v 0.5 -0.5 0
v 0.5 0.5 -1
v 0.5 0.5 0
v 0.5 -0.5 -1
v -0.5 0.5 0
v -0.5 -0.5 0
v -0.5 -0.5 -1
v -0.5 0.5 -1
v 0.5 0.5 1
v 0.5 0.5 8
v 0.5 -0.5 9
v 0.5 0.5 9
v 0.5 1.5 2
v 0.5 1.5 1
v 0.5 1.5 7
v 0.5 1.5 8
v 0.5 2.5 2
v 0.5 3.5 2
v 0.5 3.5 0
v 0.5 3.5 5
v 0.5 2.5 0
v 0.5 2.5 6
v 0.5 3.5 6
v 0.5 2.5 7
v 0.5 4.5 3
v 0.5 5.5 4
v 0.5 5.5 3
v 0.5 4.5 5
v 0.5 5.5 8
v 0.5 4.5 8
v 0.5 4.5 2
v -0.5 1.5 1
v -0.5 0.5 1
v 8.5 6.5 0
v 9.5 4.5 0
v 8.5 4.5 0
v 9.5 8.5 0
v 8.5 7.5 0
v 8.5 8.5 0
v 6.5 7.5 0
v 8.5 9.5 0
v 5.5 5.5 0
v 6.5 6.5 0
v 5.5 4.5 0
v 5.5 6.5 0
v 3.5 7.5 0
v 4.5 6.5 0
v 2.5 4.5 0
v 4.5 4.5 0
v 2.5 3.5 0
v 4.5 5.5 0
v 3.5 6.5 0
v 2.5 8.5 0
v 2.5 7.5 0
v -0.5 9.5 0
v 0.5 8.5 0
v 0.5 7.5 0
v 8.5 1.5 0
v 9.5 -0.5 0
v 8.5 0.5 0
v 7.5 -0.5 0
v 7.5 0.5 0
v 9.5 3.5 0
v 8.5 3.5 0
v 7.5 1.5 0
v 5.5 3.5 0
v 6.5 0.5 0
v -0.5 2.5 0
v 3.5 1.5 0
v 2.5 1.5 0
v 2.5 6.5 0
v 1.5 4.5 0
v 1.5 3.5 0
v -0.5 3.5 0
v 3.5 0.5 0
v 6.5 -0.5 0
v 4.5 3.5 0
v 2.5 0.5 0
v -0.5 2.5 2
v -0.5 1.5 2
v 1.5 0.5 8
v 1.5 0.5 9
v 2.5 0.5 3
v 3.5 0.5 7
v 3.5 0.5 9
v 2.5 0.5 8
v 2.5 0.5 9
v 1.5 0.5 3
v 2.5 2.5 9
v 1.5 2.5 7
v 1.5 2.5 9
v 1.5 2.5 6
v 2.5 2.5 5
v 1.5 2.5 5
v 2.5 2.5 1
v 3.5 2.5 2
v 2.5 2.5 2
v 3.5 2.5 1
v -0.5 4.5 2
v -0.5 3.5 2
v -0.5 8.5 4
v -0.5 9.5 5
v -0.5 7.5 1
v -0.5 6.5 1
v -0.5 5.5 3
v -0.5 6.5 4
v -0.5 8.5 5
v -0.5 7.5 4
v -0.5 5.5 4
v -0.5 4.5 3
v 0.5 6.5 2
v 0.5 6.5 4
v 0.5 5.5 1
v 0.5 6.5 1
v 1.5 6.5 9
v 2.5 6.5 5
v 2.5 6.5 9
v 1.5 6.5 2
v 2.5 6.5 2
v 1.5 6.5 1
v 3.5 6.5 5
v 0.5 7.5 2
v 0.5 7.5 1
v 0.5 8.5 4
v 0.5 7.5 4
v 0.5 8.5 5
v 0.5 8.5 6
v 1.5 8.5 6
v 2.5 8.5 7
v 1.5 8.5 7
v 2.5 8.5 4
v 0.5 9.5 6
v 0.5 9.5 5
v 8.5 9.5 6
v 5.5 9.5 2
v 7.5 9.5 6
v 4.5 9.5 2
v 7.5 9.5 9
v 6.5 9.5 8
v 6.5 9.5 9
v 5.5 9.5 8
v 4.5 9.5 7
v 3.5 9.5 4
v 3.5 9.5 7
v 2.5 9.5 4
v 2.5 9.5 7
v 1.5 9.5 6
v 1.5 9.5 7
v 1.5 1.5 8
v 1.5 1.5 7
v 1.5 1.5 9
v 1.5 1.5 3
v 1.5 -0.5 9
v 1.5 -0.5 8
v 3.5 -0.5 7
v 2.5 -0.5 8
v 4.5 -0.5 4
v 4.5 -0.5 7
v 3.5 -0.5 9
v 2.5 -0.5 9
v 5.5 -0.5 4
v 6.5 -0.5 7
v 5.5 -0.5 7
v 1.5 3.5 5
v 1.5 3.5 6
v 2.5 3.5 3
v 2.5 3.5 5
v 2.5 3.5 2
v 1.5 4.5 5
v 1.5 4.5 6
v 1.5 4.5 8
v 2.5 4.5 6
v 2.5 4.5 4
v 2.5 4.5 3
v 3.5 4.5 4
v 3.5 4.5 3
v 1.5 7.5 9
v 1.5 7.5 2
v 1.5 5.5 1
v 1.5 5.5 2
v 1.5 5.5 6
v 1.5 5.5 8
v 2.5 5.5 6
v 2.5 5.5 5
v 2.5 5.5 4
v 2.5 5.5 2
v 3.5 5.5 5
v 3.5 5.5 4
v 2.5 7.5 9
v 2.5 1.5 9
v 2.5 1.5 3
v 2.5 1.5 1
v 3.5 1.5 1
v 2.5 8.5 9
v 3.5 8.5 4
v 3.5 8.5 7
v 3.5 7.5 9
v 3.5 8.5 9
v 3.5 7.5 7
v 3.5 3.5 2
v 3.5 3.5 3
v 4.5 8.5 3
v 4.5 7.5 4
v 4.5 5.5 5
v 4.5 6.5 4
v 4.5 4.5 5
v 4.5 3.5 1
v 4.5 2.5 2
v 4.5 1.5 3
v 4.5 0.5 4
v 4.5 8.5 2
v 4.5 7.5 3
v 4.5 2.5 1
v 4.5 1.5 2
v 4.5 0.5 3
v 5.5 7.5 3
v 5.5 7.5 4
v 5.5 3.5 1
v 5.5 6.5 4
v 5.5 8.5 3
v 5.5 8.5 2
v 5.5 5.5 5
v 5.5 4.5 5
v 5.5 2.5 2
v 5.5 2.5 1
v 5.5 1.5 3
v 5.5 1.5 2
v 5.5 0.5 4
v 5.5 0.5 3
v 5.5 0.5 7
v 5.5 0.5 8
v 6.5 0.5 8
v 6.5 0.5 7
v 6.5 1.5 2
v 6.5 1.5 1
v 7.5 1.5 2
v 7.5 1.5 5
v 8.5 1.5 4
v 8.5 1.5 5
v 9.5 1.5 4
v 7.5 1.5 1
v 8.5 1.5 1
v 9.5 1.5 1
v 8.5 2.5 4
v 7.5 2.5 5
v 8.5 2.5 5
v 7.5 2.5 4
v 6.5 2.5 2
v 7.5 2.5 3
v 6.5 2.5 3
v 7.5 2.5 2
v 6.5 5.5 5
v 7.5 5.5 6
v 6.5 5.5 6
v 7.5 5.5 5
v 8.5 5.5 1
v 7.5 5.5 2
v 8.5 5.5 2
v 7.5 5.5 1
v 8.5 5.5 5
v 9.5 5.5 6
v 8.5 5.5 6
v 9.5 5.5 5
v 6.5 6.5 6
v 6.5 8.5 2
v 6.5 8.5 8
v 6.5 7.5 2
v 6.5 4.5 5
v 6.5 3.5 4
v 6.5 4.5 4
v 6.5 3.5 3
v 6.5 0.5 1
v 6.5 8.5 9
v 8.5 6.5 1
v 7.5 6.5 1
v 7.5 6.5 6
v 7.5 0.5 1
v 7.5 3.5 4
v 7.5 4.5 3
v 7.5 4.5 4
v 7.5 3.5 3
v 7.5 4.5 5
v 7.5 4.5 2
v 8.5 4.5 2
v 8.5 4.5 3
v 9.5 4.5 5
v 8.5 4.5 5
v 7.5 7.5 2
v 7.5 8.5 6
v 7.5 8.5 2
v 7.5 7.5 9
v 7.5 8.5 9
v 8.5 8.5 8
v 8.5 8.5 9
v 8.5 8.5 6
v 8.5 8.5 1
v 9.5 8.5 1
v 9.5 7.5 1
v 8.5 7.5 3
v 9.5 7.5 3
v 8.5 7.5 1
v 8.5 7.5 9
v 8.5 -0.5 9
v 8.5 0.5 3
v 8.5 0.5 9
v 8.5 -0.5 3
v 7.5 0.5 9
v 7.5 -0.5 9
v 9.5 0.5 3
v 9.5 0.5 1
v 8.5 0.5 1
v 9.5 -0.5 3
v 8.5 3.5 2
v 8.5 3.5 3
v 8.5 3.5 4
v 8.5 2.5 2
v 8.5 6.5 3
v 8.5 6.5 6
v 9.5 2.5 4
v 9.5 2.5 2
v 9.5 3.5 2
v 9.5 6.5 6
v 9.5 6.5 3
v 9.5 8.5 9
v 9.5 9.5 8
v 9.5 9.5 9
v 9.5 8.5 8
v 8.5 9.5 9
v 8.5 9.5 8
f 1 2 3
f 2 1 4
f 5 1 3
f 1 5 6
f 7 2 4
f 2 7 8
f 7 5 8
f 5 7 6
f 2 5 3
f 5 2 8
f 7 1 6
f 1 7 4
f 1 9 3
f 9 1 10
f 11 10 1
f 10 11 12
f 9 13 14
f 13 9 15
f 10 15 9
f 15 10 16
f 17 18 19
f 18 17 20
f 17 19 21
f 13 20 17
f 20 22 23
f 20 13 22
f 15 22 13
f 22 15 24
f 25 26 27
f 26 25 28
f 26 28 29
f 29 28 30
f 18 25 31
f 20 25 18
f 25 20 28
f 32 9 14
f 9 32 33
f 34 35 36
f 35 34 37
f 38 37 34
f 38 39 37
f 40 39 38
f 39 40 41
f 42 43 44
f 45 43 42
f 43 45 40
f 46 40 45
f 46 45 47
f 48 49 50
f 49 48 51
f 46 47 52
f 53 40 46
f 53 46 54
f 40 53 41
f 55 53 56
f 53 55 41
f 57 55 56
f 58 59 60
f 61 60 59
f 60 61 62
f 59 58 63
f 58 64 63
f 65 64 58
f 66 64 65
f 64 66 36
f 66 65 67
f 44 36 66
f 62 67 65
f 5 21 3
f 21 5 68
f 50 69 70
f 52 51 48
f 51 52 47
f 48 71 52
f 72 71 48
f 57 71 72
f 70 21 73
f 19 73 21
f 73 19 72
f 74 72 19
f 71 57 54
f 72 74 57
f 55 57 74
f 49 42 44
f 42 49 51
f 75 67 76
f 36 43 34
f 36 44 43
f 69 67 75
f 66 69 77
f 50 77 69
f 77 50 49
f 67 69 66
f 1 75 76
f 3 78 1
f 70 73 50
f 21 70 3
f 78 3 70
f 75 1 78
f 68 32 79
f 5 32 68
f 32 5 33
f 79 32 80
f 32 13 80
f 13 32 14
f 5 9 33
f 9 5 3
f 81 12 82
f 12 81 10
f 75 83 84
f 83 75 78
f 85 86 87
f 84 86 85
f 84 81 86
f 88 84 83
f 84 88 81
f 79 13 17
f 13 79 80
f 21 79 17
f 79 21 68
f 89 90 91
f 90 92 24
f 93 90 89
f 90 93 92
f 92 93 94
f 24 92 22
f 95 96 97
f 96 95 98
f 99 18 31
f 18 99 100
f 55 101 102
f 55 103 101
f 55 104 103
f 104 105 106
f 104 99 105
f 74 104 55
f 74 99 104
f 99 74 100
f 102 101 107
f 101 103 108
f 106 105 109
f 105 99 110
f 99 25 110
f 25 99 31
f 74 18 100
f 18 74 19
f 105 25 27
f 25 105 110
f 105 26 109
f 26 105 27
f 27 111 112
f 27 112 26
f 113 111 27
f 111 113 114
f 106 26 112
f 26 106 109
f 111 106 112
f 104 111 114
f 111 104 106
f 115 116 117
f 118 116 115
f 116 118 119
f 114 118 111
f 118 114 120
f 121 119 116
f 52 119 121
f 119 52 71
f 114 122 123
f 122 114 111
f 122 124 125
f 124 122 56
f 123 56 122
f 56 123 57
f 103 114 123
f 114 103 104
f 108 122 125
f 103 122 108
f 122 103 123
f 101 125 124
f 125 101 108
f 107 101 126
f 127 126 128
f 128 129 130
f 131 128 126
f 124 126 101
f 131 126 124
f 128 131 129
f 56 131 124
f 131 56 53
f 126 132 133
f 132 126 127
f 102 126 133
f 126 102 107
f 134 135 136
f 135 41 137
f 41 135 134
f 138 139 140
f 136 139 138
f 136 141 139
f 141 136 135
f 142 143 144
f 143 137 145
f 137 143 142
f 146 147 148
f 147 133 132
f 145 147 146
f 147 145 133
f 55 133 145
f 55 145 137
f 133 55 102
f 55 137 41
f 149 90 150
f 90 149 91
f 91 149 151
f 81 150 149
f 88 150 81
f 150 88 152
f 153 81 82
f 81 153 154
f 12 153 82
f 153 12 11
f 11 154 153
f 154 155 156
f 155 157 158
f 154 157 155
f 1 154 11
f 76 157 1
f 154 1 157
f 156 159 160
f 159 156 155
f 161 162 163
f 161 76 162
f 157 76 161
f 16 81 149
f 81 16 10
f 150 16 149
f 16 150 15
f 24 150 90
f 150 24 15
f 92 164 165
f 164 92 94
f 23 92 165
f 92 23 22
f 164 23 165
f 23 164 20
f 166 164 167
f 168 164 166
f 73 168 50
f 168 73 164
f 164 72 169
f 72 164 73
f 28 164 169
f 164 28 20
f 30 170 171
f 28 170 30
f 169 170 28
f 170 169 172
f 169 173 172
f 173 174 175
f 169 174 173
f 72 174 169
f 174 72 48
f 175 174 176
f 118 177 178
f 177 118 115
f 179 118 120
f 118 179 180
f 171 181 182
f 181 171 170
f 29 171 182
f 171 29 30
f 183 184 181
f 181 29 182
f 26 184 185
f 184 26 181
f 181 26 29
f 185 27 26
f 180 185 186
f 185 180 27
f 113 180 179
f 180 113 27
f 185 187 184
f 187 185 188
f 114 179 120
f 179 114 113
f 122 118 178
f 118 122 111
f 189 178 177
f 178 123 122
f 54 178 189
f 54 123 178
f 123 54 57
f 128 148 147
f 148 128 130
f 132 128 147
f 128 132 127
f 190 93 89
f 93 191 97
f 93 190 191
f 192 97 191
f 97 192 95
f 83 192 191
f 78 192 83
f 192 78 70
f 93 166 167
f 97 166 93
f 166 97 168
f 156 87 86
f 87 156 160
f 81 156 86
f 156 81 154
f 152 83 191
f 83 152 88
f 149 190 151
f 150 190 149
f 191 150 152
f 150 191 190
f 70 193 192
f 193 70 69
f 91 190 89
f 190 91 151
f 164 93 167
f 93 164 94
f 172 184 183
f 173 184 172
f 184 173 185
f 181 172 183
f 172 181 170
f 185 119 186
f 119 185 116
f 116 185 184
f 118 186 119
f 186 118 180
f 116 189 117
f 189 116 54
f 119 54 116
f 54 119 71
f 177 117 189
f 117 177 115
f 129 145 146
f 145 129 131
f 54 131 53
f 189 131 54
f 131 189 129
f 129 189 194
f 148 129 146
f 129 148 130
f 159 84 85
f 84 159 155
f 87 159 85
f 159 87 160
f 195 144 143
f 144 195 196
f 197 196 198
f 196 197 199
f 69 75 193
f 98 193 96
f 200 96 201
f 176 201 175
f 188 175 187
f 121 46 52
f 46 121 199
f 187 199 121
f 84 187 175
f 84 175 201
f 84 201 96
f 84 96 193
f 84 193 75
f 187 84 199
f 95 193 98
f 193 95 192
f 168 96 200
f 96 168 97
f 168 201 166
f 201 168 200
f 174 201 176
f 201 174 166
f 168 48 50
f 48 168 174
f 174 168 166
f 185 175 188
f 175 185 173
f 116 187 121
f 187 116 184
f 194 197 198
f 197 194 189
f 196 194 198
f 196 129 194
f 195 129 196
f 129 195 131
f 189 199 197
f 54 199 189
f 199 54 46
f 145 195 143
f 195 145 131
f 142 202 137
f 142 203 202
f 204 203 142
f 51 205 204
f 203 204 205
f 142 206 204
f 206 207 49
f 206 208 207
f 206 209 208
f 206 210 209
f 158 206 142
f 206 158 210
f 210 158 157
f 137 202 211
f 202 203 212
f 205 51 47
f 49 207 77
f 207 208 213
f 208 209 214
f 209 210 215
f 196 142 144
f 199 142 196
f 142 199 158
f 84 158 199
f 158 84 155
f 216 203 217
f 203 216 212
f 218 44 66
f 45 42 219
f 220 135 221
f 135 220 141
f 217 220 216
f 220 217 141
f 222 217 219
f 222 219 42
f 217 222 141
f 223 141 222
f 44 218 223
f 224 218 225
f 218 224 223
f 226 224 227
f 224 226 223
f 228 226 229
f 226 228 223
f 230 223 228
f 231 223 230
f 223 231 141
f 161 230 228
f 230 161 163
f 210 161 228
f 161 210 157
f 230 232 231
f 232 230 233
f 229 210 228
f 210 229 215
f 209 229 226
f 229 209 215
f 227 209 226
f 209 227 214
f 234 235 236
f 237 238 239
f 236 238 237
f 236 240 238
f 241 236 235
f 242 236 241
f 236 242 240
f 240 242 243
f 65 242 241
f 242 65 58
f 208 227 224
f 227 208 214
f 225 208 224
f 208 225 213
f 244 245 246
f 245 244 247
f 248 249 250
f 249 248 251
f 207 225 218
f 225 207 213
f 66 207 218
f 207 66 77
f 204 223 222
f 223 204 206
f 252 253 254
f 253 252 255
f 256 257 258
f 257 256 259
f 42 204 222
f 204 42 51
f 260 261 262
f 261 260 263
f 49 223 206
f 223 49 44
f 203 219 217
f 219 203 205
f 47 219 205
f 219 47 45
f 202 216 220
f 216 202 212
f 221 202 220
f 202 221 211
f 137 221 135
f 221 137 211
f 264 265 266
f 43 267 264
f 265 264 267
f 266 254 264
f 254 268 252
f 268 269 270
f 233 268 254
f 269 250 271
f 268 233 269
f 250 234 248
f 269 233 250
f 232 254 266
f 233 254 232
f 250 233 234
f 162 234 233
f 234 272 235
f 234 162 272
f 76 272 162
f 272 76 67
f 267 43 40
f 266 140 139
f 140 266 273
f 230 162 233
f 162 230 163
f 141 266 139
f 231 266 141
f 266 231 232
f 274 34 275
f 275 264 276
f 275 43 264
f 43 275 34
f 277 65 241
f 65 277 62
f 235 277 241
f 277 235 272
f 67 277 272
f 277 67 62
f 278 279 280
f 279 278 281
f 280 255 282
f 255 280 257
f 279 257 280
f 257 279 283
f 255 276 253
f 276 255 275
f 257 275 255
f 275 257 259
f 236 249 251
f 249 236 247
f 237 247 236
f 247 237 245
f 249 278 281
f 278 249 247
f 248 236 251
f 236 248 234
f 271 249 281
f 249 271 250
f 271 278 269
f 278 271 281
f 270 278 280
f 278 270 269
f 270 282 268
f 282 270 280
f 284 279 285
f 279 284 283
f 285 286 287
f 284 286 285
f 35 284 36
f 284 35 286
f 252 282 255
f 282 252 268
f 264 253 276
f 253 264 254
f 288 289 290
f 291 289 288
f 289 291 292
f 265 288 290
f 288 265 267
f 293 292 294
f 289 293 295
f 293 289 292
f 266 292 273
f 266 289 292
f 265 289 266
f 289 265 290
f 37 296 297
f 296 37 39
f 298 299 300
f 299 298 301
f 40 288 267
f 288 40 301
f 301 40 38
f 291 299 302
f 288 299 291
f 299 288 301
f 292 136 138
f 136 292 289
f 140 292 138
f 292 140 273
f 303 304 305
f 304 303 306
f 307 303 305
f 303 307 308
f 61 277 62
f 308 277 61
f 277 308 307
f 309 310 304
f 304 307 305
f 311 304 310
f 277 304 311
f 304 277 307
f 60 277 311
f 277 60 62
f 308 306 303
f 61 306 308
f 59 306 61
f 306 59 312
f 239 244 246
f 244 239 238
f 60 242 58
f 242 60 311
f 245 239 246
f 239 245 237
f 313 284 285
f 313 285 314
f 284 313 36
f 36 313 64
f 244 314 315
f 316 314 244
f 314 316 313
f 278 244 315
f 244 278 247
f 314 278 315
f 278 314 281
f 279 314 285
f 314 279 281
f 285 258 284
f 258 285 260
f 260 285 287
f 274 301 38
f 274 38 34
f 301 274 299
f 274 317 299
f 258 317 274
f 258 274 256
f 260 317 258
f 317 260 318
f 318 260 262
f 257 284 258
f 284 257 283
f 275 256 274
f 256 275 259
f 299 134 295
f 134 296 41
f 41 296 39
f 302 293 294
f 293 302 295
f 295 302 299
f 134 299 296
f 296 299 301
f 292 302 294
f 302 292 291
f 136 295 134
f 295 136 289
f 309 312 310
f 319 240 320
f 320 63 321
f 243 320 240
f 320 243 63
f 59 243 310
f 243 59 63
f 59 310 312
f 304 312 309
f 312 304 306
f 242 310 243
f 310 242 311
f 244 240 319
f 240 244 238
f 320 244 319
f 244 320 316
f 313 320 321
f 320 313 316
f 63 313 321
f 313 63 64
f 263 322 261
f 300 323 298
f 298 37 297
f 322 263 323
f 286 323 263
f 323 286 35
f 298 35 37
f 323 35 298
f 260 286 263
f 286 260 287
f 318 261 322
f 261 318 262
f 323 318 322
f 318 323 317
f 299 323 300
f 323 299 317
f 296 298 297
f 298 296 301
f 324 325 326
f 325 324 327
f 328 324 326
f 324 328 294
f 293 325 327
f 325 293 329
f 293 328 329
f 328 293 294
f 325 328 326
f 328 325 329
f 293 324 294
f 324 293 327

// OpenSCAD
union() {
    translate([0, 0, -0.5]) color([1, 0, 0]) cube([1, 1, 1], center=true);
    translate([0, 1, 0.5]) cube([1, 1, 1], center=true);
    translate([0, 2, 1.0]) cube([1, 1, 2], center=true);
    translate([0, 4, 1.0]) cube([1, 1, 2], center=true);
    translate([0, 5, 1.5]) cube([1, 1, 3], center=true);
    translate([0, 6, 2.0]) cube([1, 1, 4], center=true);
    translate([0, 7, 0.5]) cube([1, 1, 1], center=true);
    translate([0, 8, 2.0]) cube([1, 1, 4], center=true);
    translate([0, 9, 2.5]) cube([1, 1, 5], center=true);
    translate([1, 0, 4.5]) cube([1, 1, 9], center=true);
    translate([1, 1, 4.0]) cube([1, 1, 8], center=true);
    translate([1, 2, 3.5]) cube([1, 1, 7], center=true);
    translate([1, 3, 3.0]) cube([1, 1, 6], center=true);
    translate([1, 4, 2.5]) cube([1, 1, 5], center=true);
    translate([1, 5, 4.0]) cube([1, 1, 8], center=true);
    translate([1, 6, 0.5]) cube([1, 1, 1], center=true);
    translate([1, 7, 1.0]) cube([1, 1, 2], center=true);
    translate([1, 9, 3.0]) cube([1, 1, 6], center=true);
    translate([2, 0, 4.0]) cube([1, 1, 8], center=true);
    translate([2, 1, 1.5]) cube([1, 1, 3], center=true);
    translate([2, 2, 4.5]) cube([1, 1, 9], center=true);
    translate([2, 3, 2.5]) cube([1, 1, 5], center=true);
    translate([2, 5, 3.0]) cube([1, 1, 6], center=true);
    translate([2, 6, 1.0]) cube([1, 1, 2], center=true);
    translate([2, 7, 4.5]) cube([1, 1, 9], center=true);
    translate([2, 9, 3.5]) cube([1, 1, 7], center=true);
    translate([3, 0, 4.5]) cube([1, 1, 9], center=true);
    translate([3, 2, 0.5]) cube([1, 1, 1], center=true);
    translate([3, 3, 1.0]) cube([1, 1, 2], center=true);
    translate([3, 4, 1.5]) cube([1, 1, 3], center=true);
    translate([3, 5, 2.0]) cube([1, 1, 4], center=true);
    translate([3, 6, 2.5]) cube([1, 1, 5], center=true);
    translate([3, 8, 4.5]) cube([1, 1, 9], center=true);
    translate([3, 9, 2.0]) cube([1, 1, 4], center=true);
    translate([4, 0, 3.5]) cube([1, 1, 7], center=true);
    translate([4, 1, 3.5]) cube([1, 1, 7], center=true);
    translate([4, 2, 3.5]) cube([1, 1, 7], center=true);
    translate([4, 3, 3.5]) cube([1, 1, 7], center=true);
    translate([4, 4, 3.5]) cube([1, 1, 7], center=true);
    translate([4, 5, 3.5]) cube([1, 1, 7], center=true);
    translate([4, 6, 3.5]) cube([1, 1, 7], center=true);
    translate([4, 7, 3.5]) cube([1, 1, 7], center=true);
    translate([4, 8, 3.5]) cube([1, 1, 7], center=true);
    translate([4, 9, 3.5]) cube([1, 1, 7], center=true);
    translate([5, 0, 2.0]) cube([1, 1, 4], center=true);
    translate([5, 1, 1.5]) cube([1, 1, 3], center=true);
    translate([5, 2, 1.0]) cube([1, 1, 2], center=true);
    translate([5, 3, 0.5]) cube([1, 1, 1], center=true);
    translate([5, 5, 2.5]) cube([1, 1, 5], center=true);
    translate([5, 7, 2.0]) cube([1, 1, 4], center=true);
    translate([5, 8, 1.5]) cube([1, 1, 3], center=true);
    translate([5, 9, 1.0]) cube([1, 1, 2], center=true);
    translate([6, 0, 3.5]) cube([1, 1, 7], center=true);
    translate([6, 1, 4.0]) cube([1, 1, 8], center=true);
    translate([6, 2, 4.0]) cube([1, 1, 8], center=true);
    translate([6, 3, 4.0]) cube([1, 1, 8], center=true);
    translate([6, 4, 4.0]) cube([1, 1, 8], center=true);
    translate([6, 5, 4.0]) cube([1, 1, 8], center=true);
    translate([6, 6, 4.0]) cube([1, 1, 8], center=true);
    translate([6, 7, 4.0]) cube([1, 1, 8], center=true);
    translate([6, 8, 4.0]) cube([1, 1, 8], center=true);
    translate([6, 9, 4.0]) cube([1, 1, 8], center=true);
    translate([7, 1, 0.5]) cube([1, 1, 1], center=true);
    translate([7, 2, 1.0]) cube([1, 1, 2], center=true);
    translate([7, 3, 1.5]) cube([1, 1, 3], center=true);
    translate([7, 4, 2.0]) cube([1, 1, 4], center=true);
    translate([7, 5, 2.5]) cube([1, 1, 5], center=true);
    translate([7, 6, 3.0]) cube([1, 1, 6], center=true);
    translate([7, 8, 1.0]) cube([1, 1, 2], center=true);
    translate([7, 9, 4.5]) cube([1, 1, 9], center=true);
    translate([8, 0, 4.5]) cube([1, 1, 9], center=true);
    translate([8, 2, 2.5]) cube([1, 1, 5], center=true);
    translate([8, 3, 2.0]) cube([1, 1, 4], center=true);
    translate([8, 4, 1.5]) cube([1, 1, 3], center=true);
    translate([8, 5, 1.0]) cube([1, 1, 2], center=true);
    translate([8, 6, 0.5]) cube([1, 1, 1], center=true);
    translate([8, 8, 4.5]) cube([1, 1, 9], center=true);
    translate([8, 9, 3.0]) cube([1, 1, 6], center=true);
    translate([9, 0, 1.5]) cube([1, 1, 3], center=true);
    translate([9, 1, 0.5]) cube([1, 1, 1], center=true);
    translate([9, 2, 2.0]) cube([1, 1, 4], center=true);
    translate([9, 3, 1.0]) cube([1, 1, 2], center=true);
    translate([9, 5, 2.5]) cube([1, 1, 5], center=true);
    translate([9, 6, 3.0]) cube([1, 1, 6], center=true);
    translate([9, 7, 1.5]) cube([1, 1, 3], center=true);
    translate([9, 8, 0.5]) cube([1, 1, 1], center=true);
    translate([9, 9, 8.5]) color([0, 0, 1]) cube([1, 1, 1], center=true);
}
